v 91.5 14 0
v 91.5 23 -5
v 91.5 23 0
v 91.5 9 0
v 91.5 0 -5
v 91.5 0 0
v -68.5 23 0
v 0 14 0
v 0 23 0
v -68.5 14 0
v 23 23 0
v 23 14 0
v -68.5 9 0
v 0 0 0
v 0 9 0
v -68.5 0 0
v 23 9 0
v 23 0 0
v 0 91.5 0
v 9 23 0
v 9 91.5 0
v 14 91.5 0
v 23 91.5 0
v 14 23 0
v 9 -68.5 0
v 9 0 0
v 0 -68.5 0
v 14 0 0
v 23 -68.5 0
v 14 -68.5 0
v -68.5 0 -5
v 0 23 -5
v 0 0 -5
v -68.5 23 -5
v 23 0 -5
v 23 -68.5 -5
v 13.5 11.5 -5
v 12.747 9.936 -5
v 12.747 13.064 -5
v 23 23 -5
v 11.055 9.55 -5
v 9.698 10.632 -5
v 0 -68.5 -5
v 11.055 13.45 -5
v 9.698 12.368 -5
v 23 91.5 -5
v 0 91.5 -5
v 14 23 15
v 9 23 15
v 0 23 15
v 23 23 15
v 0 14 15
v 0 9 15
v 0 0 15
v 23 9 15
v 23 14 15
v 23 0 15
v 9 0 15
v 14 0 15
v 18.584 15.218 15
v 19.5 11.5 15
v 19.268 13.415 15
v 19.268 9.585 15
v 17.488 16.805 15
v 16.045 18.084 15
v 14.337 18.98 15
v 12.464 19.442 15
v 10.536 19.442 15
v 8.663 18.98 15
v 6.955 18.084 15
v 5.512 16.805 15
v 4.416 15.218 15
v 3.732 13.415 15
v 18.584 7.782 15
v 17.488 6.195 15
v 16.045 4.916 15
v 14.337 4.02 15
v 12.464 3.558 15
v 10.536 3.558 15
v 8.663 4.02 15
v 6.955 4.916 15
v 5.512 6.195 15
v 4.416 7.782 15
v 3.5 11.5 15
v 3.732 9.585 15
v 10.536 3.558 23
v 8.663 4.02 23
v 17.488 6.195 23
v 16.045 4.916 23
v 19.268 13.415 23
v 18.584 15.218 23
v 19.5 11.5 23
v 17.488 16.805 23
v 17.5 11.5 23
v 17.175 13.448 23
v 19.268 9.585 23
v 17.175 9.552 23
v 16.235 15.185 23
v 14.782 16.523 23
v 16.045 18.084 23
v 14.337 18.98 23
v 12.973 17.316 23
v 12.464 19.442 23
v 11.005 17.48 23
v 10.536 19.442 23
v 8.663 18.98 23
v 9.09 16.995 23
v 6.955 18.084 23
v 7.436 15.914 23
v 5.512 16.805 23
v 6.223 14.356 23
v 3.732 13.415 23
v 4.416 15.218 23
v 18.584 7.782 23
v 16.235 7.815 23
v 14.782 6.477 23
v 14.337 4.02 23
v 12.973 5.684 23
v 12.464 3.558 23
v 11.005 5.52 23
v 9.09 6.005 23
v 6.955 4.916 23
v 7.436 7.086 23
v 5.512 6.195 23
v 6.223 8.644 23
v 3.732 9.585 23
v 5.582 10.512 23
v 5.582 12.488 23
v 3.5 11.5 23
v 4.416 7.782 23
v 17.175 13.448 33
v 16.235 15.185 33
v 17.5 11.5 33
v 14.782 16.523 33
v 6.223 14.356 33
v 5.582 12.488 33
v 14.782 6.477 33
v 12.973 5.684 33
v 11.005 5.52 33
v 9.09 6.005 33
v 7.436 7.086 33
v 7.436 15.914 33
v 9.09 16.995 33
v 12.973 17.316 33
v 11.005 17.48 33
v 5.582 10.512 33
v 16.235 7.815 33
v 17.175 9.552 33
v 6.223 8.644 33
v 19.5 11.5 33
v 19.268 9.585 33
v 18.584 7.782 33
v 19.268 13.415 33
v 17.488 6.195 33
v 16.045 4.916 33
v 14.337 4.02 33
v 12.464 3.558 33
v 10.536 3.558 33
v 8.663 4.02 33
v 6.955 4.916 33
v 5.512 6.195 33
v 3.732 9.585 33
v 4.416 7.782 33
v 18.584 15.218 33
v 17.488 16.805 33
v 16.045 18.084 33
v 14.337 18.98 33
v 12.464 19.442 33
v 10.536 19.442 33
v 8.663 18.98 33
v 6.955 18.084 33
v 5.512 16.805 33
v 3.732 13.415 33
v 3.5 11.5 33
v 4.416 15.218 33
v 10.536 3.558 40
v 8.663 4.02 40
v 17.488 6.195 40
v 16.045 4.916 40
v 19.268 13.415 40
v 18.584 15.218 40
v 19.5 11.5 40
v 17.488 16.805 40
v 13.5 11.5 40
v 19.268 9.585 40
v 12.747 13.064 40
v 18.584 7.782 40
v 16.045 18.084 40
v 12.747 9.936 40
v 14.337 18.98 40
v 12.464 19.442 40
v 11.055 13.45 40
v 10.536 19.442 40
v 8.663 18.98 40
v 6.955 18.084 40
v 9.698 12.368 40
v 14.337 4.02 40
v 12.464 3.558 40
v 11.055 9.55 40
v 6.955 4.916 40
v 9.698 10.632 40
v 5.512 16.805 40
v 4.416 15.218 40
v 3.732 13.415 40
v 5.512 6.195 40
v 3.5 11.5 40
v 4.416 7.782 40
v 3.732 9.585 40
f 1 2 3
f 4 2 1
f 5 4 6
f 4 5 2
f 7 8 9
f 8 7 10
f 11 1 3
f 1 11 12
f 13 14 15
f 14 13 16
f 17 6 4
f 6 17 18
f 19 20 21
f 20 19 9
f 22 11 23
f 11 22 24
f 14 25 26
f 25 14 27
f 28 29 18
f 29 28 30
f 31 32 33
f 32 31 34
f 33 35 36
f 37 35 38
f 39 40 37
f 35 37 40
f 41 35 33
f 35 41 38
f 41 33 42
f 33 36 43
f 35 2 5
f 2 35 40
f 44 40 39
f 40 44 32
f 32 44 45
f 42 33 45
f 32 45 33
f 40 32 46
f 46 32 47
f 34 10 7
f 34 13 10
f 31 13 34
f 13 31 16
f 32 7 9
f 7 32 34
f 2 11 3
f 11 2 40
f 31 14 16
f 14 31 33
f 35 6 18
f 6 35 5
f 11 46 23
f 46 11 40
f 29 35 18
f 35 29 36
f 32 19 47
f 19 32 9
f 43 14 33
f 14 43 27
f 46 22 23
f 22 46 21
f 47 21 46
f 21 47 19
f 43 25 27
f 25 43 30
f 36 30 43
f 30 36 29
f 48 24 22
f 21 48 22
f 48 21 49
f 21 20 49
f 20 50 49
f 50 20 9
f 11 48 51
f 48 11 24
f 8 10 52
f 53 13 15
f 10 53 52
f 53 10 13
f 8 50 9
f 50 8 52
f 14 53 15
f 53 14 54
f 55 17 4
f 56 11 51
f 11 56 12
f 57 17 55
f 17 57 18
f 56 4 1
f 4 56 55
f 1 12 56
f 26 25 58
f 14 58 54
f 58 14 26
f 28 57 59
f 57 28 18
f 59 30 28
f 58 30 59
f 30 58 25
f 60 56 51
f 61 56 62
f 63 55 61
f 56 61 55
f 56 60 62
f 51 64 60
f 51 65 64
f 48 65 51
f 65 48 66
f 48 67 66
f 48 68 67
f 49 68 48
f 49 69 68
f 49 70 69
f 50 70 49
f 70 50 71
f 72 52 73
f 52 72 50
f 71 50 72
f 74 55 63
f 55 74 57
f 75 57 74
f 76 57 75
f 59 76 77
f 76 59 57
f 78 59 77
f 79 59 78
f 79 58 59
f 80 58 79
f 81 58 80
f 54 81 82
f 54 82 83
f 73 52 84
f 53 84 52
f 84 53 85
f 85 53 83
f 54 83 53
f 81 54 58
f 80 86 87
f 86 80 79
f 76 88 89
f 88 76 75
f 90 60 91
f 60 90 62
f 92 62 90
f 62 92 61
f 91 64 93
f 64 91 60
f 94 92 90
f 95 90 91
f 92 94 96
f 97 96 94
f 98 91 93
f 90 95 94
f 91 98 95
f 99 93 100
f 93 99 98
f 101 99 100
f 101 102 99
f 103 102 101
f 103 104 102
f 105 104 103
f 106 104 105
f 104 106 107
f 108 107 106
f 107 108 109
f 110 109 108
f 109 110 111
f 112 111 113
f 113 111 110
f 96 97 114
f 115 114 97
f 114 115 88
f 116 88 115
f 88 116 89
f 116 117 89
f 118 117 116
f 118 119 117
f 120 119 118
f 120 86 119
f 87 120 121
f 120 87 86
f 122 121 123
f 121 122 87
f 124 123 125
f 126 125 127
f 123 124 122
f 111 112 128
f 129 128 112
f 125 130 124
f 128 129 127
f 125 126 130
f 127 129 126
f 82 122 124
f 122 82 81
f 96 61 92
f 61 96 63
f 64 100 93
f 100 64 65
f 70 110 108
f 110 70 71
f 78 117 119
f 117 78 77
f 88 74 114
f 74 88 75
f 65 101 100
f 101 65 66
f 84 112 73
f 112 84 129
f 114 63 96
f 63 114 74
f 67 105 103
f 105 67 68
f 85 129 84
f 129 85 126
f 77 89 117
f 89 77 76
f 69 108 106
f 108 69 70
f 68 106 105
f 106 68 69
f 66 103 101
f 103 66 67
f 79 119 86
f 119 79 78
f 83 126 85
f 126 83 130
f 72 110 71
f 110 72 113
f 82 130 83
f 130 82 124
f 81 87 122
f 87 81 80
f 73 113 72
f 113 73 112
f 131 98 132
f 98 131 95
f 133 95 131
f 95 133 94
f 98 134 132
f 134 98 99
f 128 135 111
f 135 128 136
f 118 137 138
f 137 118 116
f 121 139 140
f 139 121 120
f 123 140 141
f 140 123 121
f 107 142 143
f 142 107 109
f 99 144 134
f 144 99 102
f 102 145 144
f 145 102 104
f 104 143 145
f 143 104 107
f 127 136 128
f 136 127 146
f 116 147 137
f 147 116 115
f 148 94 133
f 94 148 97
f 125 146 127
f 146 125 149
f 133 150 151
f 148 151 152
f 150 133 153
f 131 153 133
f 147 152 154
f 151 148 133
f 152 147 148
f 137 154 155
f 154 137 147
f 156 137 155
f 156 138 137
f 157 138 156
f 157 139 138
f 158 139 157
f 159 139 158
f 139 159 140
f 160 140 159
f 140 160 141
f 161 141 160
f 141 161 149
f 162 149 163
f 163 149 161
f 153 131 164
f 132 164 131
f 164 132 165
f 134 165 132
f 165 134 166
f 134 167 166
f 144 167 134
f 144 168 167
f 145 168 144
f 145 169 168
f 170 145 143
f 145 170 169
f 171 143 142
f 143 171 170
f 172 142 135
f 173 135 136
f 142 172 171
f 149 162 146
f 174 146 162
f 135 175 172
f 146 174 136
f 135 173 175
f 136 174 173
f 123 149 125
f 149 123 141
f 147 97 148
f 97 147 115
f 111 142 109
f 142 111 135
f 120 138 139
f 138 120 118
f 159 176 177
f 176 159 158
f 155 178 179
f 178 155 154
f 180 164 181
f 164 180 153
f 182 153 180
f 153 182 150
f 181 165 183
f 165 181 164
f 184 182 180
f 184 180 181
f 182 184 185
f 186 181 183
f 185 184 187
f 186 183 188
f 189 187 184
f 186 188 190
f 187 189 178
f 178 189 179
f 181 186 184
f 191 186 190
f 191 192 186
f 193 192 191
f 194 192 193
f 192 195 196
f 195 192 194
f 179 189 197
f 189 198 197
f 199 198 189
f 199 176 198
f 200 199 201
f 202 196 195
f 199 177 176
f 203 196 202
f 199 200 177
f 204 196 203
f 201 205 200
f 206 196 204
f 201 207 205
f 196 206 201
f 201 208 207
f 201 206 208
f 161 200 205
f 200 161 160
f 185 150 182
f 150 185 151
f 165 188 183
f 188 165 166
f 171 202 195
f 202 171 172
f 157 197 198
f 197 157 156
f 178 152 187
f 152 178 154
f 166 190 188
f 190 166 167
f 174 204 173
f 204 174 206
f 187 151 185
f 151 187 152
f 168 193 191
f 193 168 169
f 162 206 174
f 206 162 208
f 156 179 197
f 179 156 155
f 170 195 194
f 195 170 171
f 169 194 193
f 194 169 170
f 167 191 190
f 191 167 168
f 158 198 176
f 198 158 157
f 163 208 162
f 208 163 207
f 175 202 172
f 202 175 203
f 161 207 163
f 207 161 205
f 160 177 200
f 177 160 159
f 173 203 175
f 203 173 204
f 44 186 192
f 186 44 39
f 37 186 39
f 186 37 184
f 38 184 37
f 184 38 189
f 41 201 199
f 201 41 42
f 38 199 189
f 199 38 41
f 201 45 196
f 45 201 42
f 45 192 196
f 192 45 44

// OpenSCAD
//Hot shoe ziptie adapeter

hs_width = 19;
hs_depth = 20;
hs_height = 3;
hs_slot_width = 13;
hs_slot_height = 1.5;

slope_width = 8;
slope_angle = 5;

ziptie_slot_width = 4;
ziptie_slot_height = 2;

wall_width = 2;
wall_height = 1.2;

//offset for ziptie_base
ziptie_offset1=2.5;

//offset for ziptie_base_90
ziptie_offset2=0;

ziptie_base_height = wall_width+ziptie_slot_height;
base_width = wall_width*2+hs_width;
base_depth = hs_depth+wall_width;



module hot_shoe() {
    //base cube
    difference() {
        cube([base_width, base_depth, wall_height+hs_slot_height+hs_height]);
        //hot shoe cut cube
        translate([wall_width, 0, wall_height]) cube([hs_width, hs_depth, hs_height]);
        //slot cut cube
        translate([wall_width + 0.5*(hs_width-hs_slot_width), 0, wall_height+hs_height]) cube([hs_slot_width, hs_depth, hs_slot_height]);
        //slope cut cube
        slope_x = 0.5*(base_width-slope_width);
        //slope_z = wall_width*0.8;
        slope_z = 0;
        translate([slope_x,0,slope_z]) rotate([slope_angle, 0, 0]) cube([slope_width, hs_depth, wall_width]);        
    }
}
module ziptie_base() {
    module ziptie_cut() {
      cube([ziptie_slot_width, base_depth, ziptie_slot_height]);
    }
    slot1_x = base_width/3-0.5*ziptie_slot_width-ziptie_offset1;
    slot2_x = (2*base_width/3)-0.5*ziptie_slot_width+ziptie_offset1;
    difference() {
        //base cube
        cube([base_width, base_depth, ziptie_base_height]);
        //ziptie slots
        translate([slot1_x, 0, wall_width]) ziptie_cut();
        translate([slot2_x, 0, wall_width]) ziptie_cut();
    }
    
    
}
module ziptie_base_90() {
    module ziptie_cut() {
      cube([base_width, ziptie_slot_width, ziptie_slot_height]);
    }
    slot1_y = base_width/3-0.5*ziptie_slot_width-ziptie_offset2;
    slot2_y = (2*base_width/3)-0.5*ziptie_slot_width+ziptie_offset2;
    difference() {
        //base cube
        cube([base_width, base_depth, ziptie_base_height]);
        //ziptie slots
        translate([0, slot1_y, wall_width]) ziptie_cut();
        translate([0, slot2_y, wall_width]) ziptie_cut();
    }
    
    
}

module plank_mount_base(x, y, d) {
  slider_width = 35;
  wall_bottom = 3;
  wall = 2.5;
  
  t_x = slider_width;
  t_y = x + 2 * wall;
  t_z = y + wall + wall_bottom;
  
  x_offset = 0.5 * (t_x - base_width);
  translate([-x_offset, -t_y+base_depth, -t_z])
  difference() {
    cube([t_x, t_y, t_z]);
    translate([0, wall, wall_bottom]) cube([t_x, x, y]);
    translate([0.5 * t_x, 0.5 * t_y, 0]) cylinder(h=wall_bottom, d=d, $fn=20);
  }
  
    
}

module X_stand() {
    lx = 160;
    ly = 160;
    wx = 23;
    wy = 23;
    h = 5;
    translate([-0.5*(lx-wy), 0, -h]) cube([lx, wx, h]);
    translate([0, -0.5*(ly-wx), -h]) cube([wy, ly, h]);
    
    translate([0.5*(5+wx), 23, 0]) rotate([0, -90, 0])
      linear_extrude(height=5) polygon([[0,0],[0,0.5*(lx-wx)],[15, 0]]);
    
    rotate([0, 0, 90]) translate([0.5*(5+wx), 0, 0]) rotate([0, -90, 0])
      linear_extrude(height=5) polygon([[0,0],[0,0.5*(lx-wx)],[15, 0]]);
    
    rotate([0, 0, -90]) translate([0.5*(5-wx), 23, 0]) rotate([0, -90, 0])
      linear_extrude(height=5) polygon([[0,0],[0,0.5*(lx-wx)],[15, 0]]);
    
    rotate([0, 0, 180]) translate([0.5*(5-wx), 0, 0]) rotate([0, -90, 0])
      linear_extrude(height=5) polygon([[0,0],[0,0.5*(lx-wx)],[15, 0]]);
}




module spigot() {
  d1 = 16;
  d2 = 12;
  d3 = 16;
  d4 = 23;
  h1 = 7;
  h2 = 10;
  h3 = 8;
  h4 = 15;
    
  //cylinder(h=h4, d=d4);
  translate([0,0, 0.5*h4]) cube([d4, d4, h4], center=true);
  translate([0,0, h4]) cylinder(d=d3, h=h3);
  translate([0,0, h4+h3]) cylinder(d=d2, h=h2);
  translate([0,0, h4+h3+h2]) cylinder(d=d1, h=h1);
}
module spigot_stand() {
  X_stand();
  translate([0.5*23, 0.5*23, 0]) spigot();
}






difference() {
spigot_stand();
translate([0.5*23, 0.5*23, -25]) cylinder(h=100, d=4);
}


//plank_x = 46;
//plank_y = 14;
//hole_dia = 4.9;
//translate() plank_mount_base(plank_x, plank_y, hole_dia);
//translate([0, 0, -ziptie_base_height]) ziptie_base_90();


//hot_shoe();
